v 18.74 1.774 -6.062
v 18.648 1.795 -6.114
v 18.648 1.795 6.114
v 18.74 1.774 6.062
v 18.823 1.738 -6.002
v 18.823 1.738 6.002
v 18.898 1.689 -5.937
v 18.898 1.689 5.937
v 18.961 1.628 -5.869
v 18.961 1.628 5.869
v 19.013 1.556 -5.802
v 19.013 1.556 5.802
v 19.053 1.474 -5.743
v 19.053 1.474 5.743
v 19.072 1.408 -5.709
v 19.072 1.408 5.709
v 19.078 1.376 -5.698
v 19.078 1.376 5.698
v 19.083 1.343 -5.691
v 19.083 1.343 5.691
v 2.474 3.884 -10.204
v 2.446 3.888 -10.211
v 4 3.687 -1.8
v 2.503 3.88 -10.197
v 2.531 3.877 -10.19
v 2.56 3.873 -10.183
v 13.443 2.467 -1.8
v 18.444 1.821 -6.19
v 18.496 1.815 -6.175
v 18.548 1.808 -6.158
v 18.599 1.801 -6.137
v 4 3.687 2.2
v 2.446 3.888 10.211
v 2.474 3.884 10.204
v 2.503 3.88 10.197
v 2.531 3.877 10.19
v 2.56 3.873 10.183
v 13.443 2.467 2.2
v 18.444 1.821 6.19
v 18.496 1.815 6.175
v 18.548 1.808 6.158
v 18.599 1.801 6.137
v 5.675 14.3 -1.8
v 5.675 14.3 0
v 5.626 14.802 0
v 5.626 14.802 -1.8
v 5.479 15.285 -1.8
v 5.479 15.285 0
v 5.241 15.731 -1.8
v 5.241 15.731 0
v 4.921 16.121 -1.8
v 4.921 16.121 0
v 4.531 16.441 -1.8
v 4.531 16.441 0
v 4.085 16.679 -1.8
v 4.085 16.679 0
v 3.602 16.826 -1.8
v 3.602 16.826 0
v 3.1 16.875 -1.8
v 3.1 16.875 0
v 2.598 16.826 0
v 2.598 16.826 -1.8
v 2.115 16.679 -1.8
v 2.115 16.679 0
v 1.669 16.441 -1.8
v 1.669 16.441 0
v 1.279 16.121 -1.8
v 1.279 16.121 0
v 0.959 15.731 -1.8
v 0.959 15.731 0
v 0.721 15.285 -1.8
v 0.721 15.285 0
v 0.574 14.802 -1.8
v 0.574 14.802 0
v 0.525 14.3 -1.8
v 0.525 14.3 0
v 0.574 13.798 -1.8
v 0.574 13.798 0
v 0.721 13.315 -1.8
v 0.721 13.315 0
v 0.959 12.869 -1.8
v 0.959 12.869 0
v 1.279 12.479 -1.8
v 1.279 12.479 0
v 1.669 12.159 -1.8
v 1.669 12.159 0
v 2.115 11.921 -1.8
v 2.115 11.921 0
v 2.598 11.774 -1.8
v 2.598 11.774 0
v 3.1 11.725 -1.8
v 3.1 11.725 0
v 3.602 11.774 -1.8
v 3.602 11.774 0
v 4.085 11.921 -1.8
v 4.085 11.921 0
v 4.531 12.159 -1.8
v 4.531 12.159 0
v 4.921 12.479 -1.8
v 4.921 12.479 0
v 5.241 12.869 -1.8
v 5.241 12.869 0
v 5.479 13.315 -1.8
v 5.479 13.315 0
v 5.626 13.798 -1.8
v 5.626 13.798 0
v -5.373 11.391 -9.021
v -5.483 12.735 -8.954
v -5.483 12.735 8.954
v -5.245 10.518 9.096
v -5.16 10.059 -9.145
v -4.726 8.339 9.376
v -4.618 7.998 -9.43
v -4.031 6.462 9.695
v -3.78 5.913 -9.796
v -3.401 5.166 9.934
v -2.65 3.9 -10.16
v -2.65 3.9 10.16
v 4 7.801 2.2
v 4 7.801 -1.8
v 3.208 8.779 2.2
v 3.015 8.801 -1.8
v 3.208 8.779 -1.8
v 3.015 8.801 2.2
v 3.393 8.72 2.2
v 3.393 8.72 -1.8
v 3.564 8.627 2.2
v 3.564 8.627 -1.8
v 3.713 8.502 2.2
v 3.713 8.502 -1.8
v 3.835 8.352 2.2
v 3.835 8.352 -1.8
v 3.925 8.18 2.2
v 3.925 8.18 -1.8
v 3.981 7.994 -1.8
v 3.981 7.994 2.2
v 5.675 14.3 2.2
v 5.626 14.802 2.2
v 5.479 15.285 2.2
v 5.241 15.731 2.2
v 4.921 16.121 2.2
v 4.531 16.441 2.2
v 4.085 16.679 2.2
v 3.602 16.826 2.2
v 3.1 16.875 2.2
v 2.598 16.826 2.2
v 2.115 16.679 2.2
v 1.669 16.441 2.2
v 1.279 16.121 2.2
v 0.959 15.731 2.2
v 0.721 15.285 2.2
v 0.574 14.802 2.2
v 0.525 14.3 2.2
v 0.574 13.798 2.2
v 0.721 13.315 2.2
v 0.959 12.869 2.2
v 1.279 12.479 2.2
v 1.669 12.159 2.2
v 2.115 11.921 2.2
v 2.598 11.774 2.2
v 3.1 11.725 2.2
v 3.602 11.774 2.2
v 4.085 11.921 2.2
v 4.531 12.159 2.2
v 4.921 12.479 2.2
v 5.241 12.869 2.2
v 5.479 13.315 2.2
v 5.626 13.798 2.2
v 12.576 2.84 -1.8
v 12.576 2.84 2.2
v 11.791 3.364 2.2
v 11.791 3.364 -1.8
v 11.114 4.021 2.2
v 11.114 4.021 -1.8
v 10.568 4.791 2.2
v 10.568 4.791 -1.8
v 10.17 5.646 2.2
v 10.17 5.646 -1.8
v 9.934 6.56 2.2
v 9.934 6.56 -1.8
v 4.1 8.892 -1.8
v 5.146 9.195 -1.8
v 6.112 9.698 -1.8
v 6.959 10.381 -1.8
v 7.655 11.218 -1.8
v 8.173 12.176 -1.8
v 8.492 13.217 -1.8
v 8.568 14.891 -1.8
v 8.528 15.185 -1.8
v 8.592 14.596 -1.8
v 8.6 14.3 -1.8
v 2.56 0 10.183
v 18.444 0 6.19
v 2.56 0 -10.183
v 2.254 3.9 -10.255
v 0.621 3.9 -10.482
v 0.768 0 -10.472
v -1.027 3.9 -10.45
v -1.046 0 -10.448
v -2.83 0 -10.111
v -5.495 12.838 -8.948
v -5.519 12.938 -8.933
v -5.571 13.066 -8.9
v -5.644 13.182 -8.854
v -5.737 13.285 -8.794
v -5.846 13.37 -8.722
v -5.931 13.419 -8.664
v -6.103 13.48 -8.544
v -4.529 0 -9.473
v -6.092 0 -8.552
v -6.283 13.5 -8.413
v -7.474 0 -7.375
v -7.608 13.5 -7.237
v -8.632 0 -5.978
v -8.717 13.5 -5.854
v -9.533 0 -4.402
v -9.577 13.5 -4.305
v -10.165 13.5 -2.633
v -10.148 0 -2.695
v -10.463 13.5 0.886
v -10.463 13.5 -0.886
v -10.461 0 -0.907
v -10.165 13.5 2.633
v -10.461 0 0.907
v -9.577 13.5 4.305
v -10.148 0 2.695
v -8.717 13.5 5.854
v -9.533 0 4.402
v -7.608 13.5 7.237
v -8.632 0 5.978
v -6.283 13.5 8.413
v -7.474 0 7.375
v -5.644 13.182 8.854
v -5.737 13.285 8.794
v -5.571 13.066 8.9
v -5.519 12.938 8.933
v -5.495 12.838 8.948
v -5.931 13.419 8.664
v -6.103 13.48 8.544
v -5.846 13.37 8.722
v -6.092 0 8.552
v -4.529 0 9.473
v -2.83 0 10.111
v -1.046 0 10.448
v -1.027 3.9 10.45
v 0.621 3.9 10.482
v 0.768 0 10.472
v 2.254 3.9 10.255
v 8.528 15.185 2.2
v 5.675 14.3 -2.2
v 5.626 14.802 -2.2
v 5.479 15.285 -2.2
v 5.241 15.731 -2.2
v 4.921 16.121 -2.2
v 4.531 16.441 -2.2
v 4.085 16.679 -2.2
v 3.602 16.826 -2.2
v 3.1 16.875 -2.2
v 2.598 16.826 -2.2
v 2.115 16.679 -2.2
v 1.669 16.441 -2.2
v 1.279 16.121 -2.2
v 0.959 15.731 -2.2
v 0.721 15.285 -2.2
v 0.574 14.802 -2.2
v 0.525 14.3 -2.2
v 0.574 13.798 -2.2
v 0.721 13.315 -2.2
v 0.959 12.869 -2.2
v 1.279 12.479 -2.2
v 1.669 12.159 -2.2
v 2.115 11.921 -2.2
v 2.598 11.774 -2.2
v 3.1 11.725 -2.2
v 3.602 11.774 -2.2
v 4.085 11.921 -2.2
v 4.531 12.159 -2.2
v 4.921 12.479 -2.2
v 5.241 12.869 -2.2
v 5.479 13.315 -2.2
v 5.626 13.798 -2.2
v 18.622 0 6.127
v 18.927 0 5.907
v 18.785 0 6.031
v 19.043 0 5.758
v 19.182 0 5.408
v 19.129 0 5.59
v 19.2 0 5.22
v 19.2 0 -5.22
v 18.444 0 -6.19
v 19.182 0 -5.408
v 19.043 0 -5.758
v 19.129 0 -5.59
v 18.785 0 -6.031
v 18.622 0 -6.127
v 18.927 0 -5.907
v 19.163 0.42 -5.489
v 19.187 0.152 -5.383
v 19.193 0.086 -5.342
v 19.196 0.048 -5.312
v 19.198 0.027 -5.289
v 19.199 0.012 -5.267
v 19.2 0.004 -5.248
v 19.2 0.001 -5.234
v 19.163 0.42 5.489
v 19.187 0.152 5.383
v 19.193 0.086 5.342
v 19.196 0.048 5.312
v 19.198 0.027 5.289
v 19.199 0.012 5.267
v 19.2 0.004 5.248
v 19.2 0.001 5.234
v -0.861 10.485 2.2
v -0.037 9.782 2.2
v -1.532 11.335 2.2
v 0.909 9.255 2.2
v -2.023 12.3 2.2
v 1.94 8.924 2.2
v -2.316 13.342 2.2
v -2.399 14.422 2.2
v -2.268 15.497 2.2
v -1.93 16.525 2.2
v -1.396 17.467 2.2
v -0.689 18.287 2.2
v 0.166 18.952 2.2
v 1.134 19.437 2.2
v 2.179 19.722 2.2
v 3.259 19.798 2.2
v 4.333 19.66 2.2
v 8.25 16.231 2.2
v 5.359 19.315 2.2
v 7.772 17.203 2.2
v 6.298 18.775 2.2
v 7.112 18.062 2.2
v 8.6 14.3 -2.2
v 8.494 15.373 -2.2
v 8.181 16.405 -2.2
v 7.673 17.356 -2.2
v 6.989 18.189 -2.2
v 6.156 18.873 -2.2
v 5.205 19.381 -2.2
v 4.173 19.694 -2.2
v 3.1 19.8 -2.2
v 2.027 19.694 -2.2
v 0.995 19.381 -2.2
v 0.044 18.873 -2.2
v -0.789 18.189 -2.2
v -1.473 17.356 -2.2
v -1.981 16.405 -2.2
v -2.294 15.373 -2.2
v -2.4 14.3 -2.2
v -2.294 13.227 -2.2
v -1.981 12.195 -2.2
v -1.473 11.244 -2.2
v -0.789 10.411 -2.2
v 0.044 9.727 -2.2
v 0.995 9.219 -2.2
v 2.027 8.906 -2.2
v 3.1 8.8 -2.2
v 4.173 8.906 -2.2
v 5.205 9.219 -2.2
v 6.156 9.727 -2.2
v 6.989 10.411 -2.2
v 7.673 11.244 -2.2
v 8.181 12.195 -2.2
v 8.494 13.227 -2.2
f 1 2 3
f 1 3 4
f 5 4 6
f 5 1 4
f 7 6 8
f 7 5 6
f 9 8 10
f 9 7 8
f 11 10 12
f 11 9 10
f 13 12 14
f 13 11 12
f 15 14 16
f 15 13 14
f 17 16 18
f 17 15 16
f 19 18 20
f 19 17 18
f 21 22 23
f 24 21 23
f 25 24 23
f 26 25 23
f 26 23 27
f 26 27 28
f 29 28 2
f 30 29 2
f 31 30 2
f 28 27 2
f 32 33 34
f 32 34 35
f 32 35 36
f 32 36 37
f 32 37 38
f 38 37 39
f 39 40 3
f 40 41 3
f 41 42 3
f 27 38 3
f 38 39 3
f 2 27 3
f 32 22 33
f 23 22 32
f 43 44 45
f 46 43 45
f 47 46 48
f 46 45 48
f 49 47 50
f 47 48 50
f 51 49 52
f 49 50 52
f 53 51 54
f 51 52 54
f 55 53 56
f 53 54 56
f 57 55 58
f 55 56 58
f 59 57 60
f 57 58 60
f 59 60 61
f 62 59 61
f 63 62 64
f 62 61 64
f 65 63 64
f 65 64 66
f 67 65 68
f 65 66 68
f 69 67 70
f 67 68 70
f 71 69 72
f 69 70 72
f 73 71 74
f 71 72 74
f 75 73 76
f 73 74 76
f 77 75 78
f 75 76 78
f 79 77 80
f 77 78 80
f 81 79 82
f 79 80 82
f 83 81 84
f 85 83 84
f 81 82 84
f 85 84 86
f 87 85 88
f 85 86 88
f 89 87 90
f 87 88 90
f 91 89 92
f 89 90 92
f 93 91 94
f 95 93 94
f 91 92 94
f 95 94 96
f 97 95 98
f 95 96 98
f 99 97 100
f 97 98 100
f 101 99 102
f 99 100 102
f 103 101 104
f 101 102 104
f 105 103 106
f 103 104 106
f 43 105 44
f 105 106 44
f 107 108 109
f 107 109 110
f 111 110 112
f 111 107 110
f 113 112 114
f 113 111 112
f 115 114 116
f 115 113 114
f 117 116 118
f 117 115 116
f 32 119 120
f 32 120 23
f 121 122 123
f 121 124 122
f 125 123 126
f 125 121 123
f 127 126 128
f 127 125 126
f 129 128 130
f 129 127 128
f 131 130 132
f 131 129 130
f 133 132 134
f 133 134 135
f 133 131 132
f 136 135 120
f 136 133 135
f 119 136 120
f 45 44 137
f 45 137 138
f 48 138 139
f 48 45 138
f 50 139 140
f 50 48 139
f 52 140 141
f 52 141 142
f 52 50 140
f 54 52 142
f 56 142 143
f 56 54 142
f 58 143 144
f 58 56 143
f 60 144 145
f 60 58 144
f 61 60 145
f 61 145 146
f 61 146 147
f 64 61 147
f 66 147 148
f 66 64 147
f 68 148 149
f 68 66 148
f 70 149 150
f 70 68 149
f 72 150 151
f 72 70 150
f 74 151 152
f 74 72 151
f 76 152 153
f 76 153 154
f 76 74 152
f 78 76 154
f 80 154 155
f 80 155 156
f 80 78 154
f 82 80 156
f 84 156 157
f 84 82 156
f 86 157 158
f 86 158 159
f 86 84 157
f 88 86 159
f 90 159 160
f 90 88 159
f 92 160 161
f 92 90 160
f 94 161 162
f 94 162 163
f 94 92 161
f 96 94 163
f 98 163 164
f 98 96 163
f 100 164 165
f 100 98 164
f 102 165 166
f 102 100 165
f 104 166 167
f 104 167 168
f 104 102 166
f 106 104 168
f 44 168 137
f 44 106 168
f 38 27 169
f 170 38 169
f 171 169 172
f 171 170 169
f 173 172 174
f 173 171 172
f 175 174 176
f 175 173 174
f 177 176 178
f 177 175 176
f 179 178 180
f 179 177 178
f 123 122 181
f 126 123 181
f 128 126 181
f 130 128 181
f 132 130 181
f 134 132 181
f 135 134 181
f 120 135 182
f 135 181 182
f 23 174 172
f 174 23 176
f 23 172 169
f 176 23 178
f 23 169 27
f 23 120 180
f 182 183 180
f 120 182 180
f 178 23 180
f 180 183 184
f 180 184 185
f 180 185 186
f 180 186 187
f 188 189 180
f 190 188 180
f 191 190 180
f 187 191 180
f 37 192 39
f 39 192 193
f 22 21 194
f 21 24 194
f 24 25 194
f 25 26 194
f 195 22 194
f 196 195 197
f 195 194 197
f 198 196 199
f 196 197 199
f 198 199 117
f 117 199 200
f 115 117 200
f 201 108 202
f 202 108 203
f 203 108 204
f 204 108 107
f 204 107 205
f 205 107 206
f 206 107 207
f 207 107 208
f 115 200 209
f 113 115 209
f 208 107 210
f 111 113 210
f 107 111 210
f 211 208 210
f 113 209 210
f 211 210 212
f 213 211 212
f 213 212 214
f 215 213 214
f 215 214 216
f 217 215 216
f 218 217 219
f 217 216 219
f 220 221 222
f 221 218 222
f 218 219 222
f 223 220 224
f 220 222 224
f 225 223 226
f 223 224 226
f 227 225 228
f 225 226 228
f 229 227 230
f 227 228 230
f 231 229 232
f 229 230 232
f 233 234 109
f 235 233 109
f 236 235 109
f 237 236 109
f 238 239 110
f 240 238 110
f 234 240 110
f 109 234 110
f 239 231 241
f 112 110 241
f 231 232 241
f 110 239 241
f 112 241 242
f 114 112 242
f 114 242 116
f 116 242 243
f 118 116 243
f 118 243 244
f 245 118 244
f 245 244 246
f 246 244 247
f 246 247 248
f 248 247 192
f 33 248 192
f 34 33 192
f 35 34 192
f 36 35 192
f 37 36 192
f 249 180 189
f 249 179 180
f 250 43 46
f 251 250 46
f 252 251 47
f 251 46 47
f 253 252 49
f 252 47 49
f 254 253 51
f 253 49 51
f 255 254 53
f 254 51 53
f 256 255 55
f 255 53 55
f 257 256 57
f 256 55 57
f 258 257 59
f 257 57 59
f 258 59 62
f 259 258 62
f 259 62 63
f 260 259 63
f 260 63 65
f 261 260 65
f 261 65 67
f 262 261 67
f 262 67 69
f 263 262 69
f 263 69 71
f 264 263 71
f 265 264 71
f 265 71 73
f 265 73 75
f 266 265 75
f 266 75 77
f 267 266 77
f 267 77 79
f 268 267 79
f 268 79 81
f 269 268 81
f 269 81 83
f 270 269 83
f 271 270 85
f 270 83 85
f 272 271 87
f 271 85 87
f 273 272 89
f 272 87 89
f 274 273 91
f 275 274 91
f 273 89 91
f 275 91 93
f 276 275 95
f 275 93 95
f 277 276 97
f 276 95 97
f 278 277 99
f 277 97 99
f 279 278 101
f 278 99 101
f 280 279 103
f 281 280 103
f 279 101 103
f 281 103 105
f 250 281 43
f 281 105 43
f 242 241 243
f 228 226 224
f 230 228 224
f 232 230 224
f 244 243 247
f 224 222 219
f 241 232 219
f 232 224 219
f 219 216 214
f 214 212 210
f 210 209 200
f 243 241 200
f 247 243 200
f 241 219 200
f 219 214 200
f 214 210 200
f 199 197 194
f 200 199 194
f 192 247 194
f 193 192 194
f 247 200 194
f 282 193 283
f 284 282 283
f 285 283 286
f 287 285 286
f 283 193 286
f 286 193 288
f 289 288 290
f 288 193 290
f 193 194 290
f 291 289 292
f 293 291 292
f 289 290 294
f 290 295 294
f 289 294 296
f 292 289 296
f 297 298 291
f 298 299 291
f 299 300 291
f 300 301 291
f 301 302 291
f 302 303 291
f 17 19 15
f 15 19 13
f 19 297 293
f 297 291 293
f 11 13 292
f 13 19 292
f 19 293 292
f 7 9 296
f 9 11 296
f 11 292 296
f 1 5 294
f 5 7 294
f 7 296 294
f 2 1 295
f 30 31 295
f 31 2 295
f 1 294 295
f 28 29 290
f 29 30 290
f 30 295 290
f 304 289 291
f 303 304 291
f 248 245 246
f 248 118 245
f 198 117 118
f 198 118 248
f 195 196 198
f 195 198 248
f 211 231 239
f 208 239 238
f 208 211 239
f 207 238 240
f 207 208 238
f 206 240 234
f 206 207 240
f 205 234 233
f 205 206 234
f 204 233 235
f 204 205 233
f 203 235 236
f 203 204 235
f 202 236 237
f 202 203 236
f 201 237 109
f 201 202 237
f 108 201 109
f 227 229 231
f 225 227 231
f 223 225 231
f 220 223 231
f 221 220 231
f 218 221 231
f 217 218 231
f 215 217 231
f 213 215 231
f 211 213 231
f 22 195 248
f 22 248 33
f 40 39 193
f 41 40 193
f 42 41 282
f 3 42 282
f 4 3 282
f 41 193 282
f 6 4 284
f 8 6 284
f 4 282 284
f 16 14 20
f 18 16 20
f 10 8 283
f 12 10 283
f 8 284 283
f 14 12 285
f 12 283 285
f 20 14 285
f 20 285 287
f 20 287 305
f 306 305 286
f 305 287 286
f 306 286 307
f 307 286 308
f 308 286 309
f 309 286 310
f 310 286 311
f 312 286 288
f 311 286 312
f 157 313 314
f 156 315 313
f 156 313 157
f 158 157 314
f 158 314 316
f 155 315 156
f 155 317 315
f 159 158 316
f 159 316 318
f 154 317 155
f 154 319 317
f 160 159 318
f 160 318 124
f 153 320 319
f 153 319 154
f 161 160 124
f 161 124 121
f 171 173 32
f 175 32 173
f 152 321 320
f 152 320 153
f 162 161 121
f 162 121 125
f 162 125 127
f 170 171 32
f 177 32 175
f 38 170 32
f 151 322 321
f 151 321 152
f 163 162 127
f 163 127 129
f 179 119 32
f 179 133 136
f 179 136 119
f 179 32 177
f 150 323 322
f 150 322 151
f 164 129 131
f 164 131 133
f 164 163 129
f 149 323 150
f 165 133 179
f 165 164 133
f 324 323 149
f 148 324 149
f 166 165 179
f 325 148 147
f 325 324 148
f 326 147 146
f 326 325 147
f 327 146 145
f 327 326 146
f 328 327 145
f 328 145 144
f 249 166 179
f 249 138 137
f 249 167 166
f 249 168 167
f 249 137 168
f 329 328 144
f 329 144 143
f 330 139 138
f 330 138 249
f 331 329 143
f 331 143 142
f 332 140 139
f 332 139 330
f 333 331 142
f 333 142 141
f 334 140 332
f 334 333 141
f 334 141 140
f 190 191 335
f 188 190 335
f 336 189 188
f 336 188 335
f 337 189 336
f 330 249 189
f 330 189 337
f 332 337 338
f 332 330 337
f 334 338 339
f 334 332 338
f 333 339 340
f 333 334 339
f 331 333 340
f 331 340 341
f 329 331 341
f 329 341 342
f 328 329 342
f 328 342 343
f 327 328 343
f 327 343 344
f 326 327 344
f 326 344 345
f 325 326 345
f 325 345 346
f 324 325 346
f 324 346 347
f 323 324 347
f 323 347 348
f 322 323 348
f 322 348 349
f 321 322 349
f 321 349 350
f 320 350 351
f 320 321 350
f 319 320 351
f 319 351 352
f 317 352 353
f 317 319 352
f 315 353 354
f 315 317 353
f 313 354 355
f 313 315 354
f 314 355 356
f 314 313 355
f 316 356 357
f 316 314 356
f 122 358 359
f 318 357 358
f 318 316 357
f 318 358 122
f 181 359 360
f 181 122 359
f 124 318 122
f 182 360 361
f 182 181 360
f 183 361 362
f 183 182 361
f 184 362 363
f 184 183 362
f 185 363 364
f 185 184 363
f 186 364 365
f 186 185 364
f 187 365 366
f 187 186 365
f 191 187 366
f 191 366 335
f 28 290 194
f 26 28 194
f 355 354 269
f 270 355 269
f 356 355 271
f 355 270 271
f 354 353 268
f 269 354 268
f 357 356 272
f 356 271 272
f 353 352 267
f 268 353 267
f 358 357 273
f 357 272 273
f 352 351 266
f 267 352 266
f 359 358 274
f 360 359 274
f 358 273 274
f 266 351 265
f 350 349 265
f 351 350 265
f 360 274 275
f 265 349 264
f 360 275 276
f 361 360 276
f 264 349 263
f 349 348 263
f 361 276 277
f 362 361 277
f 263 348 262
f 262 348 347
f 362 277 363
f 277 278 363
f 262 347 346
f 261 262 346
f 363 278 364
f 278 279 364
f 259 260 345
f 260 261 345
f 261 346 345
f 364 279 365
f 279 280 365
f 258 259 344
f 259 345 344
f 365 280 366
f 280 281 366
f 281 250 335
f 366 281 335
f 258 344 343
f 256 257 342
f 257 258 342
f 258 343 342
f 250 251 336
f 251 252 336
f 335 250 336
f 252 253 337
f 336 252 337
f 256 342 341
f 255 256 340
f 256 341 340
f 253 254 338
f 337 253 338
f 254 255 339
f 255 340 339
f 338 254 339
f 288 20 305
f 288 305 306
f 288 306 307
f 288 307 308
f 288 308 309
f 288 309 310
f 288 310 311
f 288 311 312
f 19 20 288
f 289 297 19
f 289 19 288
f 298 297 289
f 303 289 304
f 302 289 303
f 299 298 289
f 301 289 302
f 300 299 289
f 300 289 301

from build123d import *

# Parameters (mm, degrees)
SKETCH1_R                = 10.5
BOSS_EXTRUDE1_DEPTH      = 13.5
CUT_EXTRUDE1_DEPTH       = 11.5
CUT_EXTRUDE1_DEPTH_BACK  = 11.5
SKETCH5_R                = 5.5
SKETCH5_R_2              = 2.575
BOSS_EXTRUDE2_DEPTH      = 2.2
BOSS_EXTRUDE2_DEPTH_BACK = 1.8
SKETCH5_4_R              = 5.5
SKETCH5_4_R_2            = 2.575
BOSS_EXTRUDE3_DEPTH      = 2.2
FILLET1_R                = 1


with BuildPart() as part:
    # Sketch1 → Boss-Extrude1 (new body)
    with BuildSketch(Plane(origin=(0, 0, 0), x_dir=(1, 0, 0), z_dir=(0, 1, 0))):
        with BuildLine():
            Line((18.443804907, 6.19010049), (2.559951525, 10.18315512))
            ThreePointArc((2.559951525, 10.18315512), (8.280383174, 6.45641189), (10.5, 0))
            ThreePointArc((10.5, 0), (8.280383174, -6.45641189), (2.559951525, -10.18315512))
            Line((2.559951525, -10.18315512), (18.443804907, -6.19010049))
            ThreePointArc((18.443804907, -6.19010049), (18.988607921, -5.835172564), (19.2, -5.220276193))
            Line((19.2, -5.220276193), (19.2, 5.220276193))
            ThreePointArc((19.2, 5.220276193), (18.988607921, 5.835172564), (18.443804907, 6.19010049))
        make_face()
        Circle(SKETCH1_R)
    extrude(amount=BOSS_EXTRUDE1_DEPTH)

    # Sketch2 → Cut-Extrude1 (cut, two sides)
    with BuildSketch(Plane.XY) as cut_extrude1_sk:
        with BuildLine():
            Line((-85.748448257, 13.5), (-10.5, 13.5))
            Line((-10.5, 13.5), (-6.28259424, 13.5))
            ThreePointArc((-6.28259424, 13.5), (-5.729347477, 13.277856401), (-5.483351282, 12.73479505))
            ThreePointArc((-5.483351282, 12.73479505), (-4.659552595, 8.127259704), (-2.65, 3.9))
            Line((-2.65, 3.9), (2.253530088, 3.9))
            ThreePointArc((2.253530088, 3.9), (2.349801107, 3.896907442), (2.445675162, 3.887642521))
            Line((2.445675162, 3.887642521), (18.648491256, 1.794874091))
            ThreePointArc((18.648491256, 1.794874091), (18.945201048, 1.645191976), (19.082540247, 1.342571122))
            Line((19.082540247, 1.342571122), (19.2, 0))
            Line((19.2, 0), (25.758334398, -74.962105194))
            Line((25.758334398, -74.962105194), (119.29298444, 42.938637392))
            Line((119.29298444, 42.938637392), (7.786201784, 131.400742585))
            Line((7.786201784, 131.400742585), (-85.748448257, 13.5))
        make_face()
    extrude(amount=CUT_EXTRUDE1_DEPTH, mode=Mode.SUBTRACT)
    extrude(cut_extrude1_sk.sketch, amount=-CUT_EXTRUDE1_DEPTH_BACK, mode=Mode.SUBTRACT)

    # Sketch5 → Boss-Extrude2 (add, two sides)
    with BuildSketch(Plane.XY) as boss_extrude2_sk:
        with BuildLine():
            Line((9.93428712, 6.560044551), (8.528350834, 15.184876952))
            ThreePointArc((8.528350834, 15.184876952), (8.582058445, 14.743886479), (8.6, 14.3))
            ThreePointArc((8.6, 14.3), (7.295235393, 10.743316151), (4, 8.874136013))
            Line((4, 8.874136013), (4, 3.9))
            Line((4, 3.9), (4, 2.282191618))
            Line((4, 2.282191618), (14.2, 2.282191618))
            ThreePointArc((14.2, 2.282191618), (11.37916934, 3.735096256), (9.93428712, 6.560044551))
        make_face()
        with Locations((3.1, 14.3)):
            Circle(SKETCH5_R)
        with Locations((3.1, 14.3)):
            Circle(SKETCH5_R_2, mode=Mode.SUBTRACT)
    extrude(amount=BOSS_EXTRUDE2_DEPTH)
    extrude(boss_extrude2_sk.sketch, amount=-BOSS_EXTRUDE2_DEPTH_BACK)

    # Sketch5<4> → Boss-Extrude3 (add)
    with BuildSketch(Plane.XY):
        with Locations((3.1, 14.3)):
            Circle(SKETCH5_4_R)
        with Locations((3.1, 14.3)):
            Circle(SKETCH5_4_R_2, mode=Mode.SUBTRACT)
    extrude(amount=-BOSS_EXTRUDE3_DEPTH)

    # Fillet1
    fillet1_edges = [part.edges().sort_by_distance(p)[0] for p in [
        (4, 8.874136013, 0.2),
    ]]
    fillet(fillet1_edges, radius=FILLET1_R)


solid = part.part
